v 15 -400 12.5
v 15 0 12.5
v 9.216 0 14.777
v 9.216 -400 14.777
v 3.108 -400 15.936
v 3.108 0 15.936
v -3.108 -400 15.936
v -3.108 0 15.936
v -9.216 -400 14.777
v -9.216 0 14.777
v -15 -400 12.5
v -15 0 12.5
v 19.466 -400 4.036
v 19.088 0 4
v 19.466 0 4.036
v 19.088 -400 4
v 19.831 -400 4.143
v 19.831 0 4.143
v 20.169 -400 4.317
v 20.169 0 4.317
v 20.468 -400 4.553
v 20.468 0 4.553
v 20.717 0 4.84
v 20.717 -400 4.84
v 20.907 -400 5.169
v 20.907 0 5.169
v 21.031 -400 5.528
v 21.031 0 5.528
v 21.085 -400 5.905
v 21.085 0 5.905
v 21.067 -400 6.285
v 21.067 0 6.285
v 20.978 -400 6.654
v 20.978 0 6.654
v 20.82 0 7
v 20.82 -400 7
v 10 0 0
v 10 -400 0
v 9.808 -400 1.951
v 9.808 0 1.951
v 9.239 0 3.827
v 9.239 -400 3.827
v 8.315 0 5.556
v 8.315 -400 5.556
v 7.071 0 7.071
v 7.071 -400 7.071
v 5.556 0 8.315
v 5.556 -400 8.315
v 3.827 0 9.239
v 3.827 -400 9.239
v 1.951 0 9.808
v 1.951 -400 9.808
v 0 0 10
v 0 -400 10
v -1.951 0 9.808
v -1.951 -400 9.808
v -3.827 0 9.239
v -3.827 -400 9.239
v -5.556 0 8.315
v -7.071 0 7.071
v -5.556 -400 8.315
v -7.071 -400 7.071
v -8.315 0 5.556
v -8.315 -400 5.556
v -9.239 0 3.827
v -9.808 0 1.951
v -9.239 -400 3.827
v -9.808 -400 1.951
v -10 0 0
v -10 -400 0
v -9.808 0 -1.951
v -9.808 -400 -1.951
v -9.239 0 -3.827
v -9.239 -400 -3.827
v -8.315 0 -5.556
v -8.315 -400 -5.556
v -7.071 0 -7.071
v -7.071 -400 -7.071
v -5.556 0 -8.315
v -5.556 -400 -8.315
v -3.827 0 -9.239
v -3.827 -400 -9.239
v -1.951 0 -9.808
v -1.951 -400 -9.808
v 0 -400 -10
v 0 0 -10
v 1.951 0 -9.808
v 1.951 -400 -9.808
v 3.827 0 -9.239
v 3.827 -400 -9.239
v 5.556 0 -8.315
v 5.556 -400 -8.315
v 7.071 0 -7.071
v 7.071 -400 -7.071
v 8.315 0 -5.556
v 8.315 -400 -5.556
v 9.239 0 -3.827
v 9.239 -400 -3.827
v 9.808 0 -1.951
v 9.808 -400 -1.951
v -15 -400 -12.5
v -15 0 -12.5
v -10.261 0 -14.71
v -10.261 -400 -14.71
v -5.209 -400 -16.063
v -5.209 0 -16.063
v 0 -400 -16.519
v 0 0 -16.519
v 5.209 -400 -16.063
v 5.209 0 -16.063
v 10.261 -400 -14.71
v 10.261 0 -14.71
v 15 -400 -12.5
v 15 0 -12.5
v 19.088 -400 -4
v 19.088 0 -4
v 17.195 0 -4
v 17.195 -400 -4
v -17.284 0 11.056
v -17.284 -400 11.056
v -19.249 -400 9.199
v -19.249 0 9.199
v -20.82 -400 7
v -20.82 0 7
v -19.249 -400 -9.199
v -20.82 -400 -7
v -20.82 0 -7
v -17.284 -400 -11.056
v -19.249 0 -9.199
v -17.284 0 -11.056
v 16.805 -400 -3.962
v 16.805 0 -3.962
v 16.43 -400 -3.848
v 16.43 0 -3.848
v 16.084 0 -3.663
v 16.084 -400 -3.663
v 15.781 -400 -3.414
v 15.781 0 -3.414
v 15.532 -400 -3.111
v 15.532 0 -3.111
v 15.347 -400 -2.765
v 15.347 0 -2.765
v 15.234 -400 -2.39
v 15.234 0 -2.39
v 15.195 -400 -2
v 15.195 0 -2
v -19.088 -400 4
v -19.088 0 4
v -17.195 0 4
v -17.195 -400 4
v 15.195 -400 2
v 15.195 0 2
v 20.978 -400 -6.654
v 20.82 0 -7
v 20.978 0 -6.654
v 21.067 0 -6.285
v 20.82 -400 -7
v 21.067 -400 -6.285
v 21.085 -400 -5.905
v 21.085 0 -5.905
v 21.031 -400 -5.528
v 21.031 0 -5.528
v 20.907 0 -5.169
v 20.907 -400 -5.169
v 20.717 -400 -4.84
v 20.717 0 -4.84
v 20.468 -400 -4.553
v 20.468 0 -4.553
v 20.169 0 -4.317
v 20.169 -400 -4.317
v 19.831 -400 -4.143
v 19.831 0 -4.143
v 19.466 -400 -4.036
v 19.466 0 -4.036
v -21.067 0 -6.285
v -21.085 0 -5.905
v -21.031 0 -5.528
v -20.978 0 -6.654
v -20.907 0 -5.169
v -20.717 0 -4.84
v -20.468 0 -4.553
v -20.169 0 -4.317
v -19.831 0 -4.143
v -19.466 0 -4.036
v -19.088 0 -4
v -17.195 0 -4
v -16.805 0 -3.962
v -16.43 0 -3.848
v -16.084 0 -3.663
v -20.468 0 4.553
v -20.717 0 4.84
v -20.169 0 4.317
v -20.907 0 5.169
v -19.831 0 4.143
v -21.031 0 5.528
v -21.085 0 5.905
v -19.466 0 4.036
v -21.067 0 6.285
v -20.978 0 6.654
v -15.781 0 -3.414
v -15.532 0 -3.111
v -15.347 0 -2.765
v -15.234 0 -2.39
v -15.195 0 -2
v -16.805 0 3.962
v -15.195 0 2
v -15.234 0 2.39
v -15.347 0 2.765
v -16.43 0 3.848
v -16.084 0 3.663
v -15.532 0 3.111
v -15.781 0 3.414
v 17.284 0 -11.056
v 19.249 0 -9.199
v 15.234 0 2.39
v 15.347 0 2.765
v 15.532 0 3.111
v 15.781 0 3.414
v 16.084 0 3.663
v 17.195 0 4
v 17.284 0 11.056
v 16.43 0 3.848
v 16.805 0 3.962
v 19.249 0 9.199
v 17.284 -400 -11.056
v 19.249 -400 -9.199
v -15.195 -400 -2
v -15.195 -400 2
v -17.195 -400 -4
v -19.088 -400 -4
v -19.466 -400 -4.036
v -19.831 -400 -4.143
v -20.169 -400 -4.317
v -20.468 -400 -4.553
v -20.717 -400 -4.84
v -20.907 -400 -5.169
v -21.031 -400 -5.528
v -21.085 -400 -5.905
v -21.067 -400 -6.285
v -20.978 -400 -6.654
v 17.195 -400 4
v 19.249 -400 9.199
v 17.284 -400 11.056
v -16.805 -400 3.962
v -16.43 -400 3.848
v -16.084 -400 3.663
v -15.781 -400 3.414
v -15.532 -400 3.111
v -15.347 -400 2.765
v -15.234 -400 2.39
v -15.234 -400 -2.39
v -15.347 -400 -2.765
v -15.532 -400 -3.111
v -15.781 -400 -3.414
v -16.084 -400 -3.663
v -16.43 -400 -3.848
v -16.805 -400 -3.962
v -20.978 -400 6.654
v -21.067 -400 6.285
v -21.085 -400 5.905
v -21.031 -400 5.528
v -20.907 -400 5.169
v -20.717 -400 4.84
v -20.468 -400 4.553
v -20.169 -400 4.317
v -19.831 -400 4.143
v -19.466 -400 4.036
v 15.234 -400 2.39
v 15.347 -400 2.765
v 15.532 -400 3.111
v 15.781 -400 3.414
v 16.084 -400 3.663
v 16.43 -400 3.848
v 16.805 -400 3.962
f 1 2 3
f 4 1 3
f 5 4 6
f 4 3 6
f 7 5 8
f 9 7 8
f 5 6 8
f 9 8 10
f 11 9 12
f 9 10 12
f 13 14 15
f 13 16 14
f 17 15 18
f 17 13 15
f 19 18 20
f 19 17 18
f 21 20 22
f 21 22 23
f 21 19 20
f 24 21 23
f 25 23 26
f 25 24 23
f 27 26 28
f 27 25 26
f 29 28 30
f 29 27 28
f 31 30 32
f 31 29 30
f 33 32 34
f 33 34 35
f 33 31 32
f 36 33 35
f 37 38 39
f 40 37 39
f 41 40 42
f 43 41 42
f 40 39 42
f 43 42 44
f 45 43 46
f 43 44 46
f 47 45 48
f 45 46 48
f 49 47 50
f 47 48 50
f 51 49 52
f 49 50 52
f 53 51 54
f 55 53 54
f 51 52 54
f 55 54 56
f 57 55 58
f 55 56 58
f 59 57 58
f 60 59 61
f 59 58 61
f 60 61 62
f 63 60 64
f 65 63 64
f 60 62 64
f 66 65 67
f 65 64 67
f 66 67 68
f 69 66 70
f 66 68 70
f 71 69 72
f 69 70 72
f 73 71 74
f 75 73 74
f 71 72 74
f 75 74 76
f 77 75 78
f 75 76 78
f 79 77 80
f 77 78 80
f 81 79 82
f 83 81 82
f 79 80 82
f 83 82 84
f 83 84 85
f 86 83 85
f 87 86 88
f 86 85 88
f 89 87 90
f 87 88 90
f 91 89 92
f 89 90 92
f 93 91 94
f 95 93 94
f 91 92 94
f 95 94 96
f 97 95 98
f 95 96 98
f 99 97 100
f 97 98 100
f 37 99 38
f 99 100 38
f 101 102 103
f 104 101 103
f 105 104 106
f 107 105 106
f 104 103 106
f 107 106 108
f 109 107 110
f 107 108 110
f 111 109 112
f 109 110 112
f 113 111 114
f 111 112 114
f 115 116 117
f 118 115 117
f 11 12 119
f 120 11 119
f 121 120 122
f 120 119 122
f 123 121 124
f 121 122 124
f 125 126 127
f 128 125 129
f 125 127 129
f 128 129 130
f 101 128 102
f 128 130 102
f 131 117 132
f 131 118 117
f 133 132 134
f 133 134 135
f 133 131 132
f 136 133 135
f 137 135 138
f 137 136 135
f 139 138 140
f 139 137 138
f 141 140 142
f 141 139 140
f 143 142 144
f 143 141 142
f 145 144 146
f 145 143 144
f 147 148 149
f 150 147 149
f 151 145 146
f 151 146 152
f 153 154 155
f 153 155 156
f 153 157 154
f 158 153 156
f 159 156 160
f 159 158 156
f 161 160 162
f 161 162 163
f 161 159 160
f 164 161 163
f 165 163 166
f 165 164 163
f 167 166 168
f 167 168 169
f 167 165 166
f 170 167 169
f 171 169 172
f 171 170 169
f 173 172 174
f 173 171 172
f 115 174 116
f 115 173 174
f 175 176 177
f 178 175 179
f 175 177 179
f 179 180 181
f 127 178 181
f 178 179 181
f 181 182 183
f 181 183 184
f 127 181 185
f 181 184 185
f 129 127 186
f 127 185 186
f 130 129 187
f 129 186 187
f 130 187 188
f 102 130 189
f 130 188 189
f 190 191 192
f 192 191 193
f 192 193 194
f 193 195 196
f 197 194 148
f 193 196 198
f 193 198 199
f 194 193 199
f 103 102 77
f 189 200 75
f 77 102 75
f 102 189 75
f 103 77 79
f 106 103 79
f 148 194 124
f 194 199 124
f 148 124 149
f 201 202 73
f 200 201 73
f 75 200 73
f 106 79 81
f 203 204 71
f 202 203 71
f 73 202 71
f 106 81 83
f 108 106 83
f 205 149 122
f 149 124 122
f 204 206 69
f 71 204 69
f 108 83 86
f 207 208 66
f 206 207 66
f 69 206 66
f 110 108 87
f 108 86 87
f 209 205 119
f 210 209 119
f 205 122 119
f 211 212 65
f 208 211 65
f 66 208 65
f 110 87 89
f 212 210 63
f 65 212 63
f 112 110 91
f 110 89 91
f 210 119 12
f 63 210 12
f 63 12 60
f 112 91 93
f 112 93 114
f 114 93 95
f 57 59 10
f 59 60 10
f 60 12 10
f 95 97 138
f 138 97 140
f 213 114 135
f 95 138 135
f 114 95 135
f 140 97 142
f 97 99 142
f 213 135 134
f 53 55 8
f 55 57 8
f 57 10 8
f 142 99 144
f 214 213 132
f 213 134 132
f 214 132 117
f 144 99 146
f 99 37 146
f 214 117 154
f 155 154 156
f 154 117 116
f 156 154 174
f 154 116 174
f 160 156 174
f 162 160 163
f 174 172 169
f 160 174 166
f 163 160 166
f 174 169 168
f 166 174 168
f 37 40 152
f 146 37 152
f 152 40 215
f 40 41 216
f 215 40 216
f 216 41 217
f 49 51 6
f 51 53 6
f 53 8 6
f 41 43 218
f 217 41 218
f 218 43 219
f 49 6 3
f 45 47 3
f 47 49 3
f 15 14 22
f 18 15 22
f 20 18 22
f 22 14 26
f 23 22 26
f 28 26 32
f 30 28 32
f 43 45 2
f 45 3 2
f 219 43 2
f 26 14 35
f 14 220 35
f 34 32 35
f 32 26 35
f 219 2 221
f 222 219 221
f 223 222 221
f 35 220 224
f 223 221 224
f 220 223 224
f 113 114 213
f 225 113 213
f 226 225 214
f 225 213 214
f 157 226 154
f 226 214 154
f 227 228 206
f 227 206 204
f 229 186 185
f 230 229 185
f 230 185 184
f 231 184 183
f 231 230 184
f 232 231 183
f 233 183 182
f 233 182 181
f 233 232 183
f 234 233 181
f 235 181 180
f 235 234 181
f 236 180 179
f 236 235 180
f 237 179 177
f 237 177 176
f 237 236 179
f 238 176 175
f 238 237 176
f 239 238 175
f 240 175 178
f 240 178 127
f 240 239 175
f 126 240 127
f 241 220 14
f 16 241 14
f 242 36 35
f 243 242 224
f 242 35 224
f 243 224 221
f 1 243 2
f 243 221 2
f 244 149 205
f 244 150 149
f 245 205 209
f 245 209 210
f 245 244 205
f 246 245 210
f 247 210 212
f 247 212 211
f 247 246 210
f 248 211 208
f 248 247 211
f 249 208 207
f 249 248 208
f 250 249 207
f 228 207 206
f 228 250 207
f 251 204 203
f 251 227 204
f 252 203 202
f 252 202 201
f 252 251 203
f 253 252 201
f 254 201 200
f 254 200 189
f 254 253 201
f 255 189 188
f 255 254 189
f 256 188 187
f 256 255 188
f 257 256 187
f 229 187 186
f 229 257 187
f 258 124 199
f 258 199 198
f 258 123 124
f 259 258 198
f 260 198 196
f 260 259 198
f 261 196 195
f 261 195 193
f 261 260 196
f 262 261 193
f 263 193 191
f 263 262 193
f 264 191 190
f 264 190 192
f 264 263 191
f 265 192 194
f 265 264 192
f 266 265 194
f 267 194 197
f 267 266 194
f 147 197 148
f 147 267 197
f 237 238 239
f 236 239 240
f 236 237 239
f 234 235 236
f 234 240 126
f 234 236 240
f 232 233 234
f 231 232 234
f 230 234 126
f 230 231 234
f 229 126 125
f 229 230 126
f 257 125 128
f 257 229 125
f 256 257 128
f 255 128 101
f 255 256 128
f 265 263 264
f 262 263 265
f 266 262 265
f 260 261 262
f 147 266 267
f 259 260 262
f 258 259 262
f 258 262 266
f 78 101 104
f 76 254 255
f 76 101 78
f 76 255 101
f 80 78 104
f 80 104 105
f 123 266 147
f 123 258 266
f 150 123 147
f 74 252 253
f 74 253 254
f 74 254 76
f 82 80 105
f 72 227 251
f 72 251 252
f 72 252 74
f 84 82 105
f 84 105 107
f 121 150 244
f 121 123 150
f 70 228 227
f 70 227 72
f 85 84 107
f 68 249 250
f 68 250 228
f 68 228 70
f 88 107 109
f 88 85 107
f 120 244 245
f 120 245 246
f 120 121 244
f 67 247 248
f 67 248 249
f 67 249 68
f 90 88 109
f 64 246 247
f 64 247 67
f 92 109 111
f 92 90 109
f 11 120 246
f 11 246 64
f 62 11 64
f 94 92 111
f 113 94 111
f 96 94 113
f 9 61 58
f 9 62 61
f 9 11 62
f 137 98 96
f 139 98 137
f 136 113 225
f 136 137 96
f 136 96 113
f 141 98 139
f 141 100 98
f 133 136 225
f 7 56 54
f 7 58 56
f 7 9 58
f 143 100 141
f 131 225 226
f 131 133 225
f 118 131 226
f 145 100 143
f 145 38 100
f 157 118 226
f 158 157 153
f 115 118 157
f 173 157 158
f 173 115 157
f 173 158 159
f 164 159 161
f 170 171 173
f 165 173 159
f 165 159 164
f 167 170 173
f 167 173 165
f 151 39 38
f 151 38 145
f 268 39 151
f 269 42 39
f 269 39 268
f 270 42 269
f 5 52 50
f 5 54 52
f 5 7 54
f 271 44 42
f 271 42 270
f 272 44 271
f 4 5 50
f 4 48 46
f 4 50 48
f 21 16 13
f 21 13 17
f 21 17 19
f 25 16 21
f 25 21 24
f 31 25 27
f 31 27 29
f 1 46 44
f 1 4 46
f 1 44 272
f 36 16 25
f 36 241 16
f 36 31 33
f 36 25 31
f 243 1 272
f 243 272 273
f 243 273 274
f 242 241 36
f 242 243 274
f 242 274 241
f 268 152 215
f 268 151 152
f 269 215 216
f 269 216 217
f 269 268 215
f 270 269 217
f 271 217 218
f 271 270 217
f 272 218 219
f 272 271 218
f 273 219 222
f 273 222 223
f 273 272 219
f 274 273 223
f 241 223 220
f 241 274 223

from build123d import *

# Parameters (mm, degrees)
F0_W     = 30
F0_H     = 25
F1_DEPTH = 400
F2_R     = 2
F3_R     = 10
F4_DEPTH = 400


with BuildPart() as f1:
    # F0 (on Front) → F1 (new body)
    with BuildSketch(Plane.XZ):
        Rectangle(F0_W, F0_H)
        with BuildLine():
            Line((-15, -12.5), (-15, 12.5))
            ThreePointArc((-15, 12.5), (-19.432726, 8.983673), (-22.111648, 4))
            Line((-22.111648, 4), (-15.19524, 4))
            Line((-15.19524, 4), (-15.19524, -4))
            Line((-15.19524, -4), (-22.111648, -4))
            ThreePointArc((-22.111648, -4), (-19.432726, -8.983673), (-15, -12.5))
        make_face()
        with BuildLine():
            ThreePointArc((-15, -12.5), (0, -16.519238), (15, -12.5))
            Line((15, -12.5), (-15, -12.5))
        make_face()
        with BuildLine():
            ThreePointArc((22.111648, 4), (19.432726, 8.983673), (15, 12.5))
            Line((15, 12.5), (15, -12.5))
            ThreePointArc((15, -12.5), (19.432726, -8.983673), (22.111648, -4))
            Line((22.111648, -4), (15.19524, -4))
            Line((15.19524, -4), (15.19524, 4))
            Line((15.19524, 4), (22.111648, 4))
        make_face()
        with BuildLine():
            Line((-15, 12.5), (15, 12.5))
            ThreePointArc((15, 12.5), (0, 16.082066), (-15, 12.5))
        make_face()
    extrude(amount=F1_DEPTH)

    # F2
    f2_edges = [f1.edges().sort_by_distance(p)[0] for p in [
        (-22.111648, -200, 4),
        (-15.19524, -200, 4),
        (-15.19524, -200, -4),
        (-22.111648, -200, -4),
        (15.19524, -200, -4),
        (22.111648, -200, 4),
        (15.19524, -200, 4),
        (22.111648, -200, -4),
    ]]
    fillet(f2_edges, radius=F2_R)

    # F3 (on face) → F4 (cut)
    with BuildSketch(Plane.XZ.offset(400)):
        Circle(F3_R)
    extrude(amount=-F4_DEPTH, mode=Mode.SUBTRACT)


solid = f1.part
